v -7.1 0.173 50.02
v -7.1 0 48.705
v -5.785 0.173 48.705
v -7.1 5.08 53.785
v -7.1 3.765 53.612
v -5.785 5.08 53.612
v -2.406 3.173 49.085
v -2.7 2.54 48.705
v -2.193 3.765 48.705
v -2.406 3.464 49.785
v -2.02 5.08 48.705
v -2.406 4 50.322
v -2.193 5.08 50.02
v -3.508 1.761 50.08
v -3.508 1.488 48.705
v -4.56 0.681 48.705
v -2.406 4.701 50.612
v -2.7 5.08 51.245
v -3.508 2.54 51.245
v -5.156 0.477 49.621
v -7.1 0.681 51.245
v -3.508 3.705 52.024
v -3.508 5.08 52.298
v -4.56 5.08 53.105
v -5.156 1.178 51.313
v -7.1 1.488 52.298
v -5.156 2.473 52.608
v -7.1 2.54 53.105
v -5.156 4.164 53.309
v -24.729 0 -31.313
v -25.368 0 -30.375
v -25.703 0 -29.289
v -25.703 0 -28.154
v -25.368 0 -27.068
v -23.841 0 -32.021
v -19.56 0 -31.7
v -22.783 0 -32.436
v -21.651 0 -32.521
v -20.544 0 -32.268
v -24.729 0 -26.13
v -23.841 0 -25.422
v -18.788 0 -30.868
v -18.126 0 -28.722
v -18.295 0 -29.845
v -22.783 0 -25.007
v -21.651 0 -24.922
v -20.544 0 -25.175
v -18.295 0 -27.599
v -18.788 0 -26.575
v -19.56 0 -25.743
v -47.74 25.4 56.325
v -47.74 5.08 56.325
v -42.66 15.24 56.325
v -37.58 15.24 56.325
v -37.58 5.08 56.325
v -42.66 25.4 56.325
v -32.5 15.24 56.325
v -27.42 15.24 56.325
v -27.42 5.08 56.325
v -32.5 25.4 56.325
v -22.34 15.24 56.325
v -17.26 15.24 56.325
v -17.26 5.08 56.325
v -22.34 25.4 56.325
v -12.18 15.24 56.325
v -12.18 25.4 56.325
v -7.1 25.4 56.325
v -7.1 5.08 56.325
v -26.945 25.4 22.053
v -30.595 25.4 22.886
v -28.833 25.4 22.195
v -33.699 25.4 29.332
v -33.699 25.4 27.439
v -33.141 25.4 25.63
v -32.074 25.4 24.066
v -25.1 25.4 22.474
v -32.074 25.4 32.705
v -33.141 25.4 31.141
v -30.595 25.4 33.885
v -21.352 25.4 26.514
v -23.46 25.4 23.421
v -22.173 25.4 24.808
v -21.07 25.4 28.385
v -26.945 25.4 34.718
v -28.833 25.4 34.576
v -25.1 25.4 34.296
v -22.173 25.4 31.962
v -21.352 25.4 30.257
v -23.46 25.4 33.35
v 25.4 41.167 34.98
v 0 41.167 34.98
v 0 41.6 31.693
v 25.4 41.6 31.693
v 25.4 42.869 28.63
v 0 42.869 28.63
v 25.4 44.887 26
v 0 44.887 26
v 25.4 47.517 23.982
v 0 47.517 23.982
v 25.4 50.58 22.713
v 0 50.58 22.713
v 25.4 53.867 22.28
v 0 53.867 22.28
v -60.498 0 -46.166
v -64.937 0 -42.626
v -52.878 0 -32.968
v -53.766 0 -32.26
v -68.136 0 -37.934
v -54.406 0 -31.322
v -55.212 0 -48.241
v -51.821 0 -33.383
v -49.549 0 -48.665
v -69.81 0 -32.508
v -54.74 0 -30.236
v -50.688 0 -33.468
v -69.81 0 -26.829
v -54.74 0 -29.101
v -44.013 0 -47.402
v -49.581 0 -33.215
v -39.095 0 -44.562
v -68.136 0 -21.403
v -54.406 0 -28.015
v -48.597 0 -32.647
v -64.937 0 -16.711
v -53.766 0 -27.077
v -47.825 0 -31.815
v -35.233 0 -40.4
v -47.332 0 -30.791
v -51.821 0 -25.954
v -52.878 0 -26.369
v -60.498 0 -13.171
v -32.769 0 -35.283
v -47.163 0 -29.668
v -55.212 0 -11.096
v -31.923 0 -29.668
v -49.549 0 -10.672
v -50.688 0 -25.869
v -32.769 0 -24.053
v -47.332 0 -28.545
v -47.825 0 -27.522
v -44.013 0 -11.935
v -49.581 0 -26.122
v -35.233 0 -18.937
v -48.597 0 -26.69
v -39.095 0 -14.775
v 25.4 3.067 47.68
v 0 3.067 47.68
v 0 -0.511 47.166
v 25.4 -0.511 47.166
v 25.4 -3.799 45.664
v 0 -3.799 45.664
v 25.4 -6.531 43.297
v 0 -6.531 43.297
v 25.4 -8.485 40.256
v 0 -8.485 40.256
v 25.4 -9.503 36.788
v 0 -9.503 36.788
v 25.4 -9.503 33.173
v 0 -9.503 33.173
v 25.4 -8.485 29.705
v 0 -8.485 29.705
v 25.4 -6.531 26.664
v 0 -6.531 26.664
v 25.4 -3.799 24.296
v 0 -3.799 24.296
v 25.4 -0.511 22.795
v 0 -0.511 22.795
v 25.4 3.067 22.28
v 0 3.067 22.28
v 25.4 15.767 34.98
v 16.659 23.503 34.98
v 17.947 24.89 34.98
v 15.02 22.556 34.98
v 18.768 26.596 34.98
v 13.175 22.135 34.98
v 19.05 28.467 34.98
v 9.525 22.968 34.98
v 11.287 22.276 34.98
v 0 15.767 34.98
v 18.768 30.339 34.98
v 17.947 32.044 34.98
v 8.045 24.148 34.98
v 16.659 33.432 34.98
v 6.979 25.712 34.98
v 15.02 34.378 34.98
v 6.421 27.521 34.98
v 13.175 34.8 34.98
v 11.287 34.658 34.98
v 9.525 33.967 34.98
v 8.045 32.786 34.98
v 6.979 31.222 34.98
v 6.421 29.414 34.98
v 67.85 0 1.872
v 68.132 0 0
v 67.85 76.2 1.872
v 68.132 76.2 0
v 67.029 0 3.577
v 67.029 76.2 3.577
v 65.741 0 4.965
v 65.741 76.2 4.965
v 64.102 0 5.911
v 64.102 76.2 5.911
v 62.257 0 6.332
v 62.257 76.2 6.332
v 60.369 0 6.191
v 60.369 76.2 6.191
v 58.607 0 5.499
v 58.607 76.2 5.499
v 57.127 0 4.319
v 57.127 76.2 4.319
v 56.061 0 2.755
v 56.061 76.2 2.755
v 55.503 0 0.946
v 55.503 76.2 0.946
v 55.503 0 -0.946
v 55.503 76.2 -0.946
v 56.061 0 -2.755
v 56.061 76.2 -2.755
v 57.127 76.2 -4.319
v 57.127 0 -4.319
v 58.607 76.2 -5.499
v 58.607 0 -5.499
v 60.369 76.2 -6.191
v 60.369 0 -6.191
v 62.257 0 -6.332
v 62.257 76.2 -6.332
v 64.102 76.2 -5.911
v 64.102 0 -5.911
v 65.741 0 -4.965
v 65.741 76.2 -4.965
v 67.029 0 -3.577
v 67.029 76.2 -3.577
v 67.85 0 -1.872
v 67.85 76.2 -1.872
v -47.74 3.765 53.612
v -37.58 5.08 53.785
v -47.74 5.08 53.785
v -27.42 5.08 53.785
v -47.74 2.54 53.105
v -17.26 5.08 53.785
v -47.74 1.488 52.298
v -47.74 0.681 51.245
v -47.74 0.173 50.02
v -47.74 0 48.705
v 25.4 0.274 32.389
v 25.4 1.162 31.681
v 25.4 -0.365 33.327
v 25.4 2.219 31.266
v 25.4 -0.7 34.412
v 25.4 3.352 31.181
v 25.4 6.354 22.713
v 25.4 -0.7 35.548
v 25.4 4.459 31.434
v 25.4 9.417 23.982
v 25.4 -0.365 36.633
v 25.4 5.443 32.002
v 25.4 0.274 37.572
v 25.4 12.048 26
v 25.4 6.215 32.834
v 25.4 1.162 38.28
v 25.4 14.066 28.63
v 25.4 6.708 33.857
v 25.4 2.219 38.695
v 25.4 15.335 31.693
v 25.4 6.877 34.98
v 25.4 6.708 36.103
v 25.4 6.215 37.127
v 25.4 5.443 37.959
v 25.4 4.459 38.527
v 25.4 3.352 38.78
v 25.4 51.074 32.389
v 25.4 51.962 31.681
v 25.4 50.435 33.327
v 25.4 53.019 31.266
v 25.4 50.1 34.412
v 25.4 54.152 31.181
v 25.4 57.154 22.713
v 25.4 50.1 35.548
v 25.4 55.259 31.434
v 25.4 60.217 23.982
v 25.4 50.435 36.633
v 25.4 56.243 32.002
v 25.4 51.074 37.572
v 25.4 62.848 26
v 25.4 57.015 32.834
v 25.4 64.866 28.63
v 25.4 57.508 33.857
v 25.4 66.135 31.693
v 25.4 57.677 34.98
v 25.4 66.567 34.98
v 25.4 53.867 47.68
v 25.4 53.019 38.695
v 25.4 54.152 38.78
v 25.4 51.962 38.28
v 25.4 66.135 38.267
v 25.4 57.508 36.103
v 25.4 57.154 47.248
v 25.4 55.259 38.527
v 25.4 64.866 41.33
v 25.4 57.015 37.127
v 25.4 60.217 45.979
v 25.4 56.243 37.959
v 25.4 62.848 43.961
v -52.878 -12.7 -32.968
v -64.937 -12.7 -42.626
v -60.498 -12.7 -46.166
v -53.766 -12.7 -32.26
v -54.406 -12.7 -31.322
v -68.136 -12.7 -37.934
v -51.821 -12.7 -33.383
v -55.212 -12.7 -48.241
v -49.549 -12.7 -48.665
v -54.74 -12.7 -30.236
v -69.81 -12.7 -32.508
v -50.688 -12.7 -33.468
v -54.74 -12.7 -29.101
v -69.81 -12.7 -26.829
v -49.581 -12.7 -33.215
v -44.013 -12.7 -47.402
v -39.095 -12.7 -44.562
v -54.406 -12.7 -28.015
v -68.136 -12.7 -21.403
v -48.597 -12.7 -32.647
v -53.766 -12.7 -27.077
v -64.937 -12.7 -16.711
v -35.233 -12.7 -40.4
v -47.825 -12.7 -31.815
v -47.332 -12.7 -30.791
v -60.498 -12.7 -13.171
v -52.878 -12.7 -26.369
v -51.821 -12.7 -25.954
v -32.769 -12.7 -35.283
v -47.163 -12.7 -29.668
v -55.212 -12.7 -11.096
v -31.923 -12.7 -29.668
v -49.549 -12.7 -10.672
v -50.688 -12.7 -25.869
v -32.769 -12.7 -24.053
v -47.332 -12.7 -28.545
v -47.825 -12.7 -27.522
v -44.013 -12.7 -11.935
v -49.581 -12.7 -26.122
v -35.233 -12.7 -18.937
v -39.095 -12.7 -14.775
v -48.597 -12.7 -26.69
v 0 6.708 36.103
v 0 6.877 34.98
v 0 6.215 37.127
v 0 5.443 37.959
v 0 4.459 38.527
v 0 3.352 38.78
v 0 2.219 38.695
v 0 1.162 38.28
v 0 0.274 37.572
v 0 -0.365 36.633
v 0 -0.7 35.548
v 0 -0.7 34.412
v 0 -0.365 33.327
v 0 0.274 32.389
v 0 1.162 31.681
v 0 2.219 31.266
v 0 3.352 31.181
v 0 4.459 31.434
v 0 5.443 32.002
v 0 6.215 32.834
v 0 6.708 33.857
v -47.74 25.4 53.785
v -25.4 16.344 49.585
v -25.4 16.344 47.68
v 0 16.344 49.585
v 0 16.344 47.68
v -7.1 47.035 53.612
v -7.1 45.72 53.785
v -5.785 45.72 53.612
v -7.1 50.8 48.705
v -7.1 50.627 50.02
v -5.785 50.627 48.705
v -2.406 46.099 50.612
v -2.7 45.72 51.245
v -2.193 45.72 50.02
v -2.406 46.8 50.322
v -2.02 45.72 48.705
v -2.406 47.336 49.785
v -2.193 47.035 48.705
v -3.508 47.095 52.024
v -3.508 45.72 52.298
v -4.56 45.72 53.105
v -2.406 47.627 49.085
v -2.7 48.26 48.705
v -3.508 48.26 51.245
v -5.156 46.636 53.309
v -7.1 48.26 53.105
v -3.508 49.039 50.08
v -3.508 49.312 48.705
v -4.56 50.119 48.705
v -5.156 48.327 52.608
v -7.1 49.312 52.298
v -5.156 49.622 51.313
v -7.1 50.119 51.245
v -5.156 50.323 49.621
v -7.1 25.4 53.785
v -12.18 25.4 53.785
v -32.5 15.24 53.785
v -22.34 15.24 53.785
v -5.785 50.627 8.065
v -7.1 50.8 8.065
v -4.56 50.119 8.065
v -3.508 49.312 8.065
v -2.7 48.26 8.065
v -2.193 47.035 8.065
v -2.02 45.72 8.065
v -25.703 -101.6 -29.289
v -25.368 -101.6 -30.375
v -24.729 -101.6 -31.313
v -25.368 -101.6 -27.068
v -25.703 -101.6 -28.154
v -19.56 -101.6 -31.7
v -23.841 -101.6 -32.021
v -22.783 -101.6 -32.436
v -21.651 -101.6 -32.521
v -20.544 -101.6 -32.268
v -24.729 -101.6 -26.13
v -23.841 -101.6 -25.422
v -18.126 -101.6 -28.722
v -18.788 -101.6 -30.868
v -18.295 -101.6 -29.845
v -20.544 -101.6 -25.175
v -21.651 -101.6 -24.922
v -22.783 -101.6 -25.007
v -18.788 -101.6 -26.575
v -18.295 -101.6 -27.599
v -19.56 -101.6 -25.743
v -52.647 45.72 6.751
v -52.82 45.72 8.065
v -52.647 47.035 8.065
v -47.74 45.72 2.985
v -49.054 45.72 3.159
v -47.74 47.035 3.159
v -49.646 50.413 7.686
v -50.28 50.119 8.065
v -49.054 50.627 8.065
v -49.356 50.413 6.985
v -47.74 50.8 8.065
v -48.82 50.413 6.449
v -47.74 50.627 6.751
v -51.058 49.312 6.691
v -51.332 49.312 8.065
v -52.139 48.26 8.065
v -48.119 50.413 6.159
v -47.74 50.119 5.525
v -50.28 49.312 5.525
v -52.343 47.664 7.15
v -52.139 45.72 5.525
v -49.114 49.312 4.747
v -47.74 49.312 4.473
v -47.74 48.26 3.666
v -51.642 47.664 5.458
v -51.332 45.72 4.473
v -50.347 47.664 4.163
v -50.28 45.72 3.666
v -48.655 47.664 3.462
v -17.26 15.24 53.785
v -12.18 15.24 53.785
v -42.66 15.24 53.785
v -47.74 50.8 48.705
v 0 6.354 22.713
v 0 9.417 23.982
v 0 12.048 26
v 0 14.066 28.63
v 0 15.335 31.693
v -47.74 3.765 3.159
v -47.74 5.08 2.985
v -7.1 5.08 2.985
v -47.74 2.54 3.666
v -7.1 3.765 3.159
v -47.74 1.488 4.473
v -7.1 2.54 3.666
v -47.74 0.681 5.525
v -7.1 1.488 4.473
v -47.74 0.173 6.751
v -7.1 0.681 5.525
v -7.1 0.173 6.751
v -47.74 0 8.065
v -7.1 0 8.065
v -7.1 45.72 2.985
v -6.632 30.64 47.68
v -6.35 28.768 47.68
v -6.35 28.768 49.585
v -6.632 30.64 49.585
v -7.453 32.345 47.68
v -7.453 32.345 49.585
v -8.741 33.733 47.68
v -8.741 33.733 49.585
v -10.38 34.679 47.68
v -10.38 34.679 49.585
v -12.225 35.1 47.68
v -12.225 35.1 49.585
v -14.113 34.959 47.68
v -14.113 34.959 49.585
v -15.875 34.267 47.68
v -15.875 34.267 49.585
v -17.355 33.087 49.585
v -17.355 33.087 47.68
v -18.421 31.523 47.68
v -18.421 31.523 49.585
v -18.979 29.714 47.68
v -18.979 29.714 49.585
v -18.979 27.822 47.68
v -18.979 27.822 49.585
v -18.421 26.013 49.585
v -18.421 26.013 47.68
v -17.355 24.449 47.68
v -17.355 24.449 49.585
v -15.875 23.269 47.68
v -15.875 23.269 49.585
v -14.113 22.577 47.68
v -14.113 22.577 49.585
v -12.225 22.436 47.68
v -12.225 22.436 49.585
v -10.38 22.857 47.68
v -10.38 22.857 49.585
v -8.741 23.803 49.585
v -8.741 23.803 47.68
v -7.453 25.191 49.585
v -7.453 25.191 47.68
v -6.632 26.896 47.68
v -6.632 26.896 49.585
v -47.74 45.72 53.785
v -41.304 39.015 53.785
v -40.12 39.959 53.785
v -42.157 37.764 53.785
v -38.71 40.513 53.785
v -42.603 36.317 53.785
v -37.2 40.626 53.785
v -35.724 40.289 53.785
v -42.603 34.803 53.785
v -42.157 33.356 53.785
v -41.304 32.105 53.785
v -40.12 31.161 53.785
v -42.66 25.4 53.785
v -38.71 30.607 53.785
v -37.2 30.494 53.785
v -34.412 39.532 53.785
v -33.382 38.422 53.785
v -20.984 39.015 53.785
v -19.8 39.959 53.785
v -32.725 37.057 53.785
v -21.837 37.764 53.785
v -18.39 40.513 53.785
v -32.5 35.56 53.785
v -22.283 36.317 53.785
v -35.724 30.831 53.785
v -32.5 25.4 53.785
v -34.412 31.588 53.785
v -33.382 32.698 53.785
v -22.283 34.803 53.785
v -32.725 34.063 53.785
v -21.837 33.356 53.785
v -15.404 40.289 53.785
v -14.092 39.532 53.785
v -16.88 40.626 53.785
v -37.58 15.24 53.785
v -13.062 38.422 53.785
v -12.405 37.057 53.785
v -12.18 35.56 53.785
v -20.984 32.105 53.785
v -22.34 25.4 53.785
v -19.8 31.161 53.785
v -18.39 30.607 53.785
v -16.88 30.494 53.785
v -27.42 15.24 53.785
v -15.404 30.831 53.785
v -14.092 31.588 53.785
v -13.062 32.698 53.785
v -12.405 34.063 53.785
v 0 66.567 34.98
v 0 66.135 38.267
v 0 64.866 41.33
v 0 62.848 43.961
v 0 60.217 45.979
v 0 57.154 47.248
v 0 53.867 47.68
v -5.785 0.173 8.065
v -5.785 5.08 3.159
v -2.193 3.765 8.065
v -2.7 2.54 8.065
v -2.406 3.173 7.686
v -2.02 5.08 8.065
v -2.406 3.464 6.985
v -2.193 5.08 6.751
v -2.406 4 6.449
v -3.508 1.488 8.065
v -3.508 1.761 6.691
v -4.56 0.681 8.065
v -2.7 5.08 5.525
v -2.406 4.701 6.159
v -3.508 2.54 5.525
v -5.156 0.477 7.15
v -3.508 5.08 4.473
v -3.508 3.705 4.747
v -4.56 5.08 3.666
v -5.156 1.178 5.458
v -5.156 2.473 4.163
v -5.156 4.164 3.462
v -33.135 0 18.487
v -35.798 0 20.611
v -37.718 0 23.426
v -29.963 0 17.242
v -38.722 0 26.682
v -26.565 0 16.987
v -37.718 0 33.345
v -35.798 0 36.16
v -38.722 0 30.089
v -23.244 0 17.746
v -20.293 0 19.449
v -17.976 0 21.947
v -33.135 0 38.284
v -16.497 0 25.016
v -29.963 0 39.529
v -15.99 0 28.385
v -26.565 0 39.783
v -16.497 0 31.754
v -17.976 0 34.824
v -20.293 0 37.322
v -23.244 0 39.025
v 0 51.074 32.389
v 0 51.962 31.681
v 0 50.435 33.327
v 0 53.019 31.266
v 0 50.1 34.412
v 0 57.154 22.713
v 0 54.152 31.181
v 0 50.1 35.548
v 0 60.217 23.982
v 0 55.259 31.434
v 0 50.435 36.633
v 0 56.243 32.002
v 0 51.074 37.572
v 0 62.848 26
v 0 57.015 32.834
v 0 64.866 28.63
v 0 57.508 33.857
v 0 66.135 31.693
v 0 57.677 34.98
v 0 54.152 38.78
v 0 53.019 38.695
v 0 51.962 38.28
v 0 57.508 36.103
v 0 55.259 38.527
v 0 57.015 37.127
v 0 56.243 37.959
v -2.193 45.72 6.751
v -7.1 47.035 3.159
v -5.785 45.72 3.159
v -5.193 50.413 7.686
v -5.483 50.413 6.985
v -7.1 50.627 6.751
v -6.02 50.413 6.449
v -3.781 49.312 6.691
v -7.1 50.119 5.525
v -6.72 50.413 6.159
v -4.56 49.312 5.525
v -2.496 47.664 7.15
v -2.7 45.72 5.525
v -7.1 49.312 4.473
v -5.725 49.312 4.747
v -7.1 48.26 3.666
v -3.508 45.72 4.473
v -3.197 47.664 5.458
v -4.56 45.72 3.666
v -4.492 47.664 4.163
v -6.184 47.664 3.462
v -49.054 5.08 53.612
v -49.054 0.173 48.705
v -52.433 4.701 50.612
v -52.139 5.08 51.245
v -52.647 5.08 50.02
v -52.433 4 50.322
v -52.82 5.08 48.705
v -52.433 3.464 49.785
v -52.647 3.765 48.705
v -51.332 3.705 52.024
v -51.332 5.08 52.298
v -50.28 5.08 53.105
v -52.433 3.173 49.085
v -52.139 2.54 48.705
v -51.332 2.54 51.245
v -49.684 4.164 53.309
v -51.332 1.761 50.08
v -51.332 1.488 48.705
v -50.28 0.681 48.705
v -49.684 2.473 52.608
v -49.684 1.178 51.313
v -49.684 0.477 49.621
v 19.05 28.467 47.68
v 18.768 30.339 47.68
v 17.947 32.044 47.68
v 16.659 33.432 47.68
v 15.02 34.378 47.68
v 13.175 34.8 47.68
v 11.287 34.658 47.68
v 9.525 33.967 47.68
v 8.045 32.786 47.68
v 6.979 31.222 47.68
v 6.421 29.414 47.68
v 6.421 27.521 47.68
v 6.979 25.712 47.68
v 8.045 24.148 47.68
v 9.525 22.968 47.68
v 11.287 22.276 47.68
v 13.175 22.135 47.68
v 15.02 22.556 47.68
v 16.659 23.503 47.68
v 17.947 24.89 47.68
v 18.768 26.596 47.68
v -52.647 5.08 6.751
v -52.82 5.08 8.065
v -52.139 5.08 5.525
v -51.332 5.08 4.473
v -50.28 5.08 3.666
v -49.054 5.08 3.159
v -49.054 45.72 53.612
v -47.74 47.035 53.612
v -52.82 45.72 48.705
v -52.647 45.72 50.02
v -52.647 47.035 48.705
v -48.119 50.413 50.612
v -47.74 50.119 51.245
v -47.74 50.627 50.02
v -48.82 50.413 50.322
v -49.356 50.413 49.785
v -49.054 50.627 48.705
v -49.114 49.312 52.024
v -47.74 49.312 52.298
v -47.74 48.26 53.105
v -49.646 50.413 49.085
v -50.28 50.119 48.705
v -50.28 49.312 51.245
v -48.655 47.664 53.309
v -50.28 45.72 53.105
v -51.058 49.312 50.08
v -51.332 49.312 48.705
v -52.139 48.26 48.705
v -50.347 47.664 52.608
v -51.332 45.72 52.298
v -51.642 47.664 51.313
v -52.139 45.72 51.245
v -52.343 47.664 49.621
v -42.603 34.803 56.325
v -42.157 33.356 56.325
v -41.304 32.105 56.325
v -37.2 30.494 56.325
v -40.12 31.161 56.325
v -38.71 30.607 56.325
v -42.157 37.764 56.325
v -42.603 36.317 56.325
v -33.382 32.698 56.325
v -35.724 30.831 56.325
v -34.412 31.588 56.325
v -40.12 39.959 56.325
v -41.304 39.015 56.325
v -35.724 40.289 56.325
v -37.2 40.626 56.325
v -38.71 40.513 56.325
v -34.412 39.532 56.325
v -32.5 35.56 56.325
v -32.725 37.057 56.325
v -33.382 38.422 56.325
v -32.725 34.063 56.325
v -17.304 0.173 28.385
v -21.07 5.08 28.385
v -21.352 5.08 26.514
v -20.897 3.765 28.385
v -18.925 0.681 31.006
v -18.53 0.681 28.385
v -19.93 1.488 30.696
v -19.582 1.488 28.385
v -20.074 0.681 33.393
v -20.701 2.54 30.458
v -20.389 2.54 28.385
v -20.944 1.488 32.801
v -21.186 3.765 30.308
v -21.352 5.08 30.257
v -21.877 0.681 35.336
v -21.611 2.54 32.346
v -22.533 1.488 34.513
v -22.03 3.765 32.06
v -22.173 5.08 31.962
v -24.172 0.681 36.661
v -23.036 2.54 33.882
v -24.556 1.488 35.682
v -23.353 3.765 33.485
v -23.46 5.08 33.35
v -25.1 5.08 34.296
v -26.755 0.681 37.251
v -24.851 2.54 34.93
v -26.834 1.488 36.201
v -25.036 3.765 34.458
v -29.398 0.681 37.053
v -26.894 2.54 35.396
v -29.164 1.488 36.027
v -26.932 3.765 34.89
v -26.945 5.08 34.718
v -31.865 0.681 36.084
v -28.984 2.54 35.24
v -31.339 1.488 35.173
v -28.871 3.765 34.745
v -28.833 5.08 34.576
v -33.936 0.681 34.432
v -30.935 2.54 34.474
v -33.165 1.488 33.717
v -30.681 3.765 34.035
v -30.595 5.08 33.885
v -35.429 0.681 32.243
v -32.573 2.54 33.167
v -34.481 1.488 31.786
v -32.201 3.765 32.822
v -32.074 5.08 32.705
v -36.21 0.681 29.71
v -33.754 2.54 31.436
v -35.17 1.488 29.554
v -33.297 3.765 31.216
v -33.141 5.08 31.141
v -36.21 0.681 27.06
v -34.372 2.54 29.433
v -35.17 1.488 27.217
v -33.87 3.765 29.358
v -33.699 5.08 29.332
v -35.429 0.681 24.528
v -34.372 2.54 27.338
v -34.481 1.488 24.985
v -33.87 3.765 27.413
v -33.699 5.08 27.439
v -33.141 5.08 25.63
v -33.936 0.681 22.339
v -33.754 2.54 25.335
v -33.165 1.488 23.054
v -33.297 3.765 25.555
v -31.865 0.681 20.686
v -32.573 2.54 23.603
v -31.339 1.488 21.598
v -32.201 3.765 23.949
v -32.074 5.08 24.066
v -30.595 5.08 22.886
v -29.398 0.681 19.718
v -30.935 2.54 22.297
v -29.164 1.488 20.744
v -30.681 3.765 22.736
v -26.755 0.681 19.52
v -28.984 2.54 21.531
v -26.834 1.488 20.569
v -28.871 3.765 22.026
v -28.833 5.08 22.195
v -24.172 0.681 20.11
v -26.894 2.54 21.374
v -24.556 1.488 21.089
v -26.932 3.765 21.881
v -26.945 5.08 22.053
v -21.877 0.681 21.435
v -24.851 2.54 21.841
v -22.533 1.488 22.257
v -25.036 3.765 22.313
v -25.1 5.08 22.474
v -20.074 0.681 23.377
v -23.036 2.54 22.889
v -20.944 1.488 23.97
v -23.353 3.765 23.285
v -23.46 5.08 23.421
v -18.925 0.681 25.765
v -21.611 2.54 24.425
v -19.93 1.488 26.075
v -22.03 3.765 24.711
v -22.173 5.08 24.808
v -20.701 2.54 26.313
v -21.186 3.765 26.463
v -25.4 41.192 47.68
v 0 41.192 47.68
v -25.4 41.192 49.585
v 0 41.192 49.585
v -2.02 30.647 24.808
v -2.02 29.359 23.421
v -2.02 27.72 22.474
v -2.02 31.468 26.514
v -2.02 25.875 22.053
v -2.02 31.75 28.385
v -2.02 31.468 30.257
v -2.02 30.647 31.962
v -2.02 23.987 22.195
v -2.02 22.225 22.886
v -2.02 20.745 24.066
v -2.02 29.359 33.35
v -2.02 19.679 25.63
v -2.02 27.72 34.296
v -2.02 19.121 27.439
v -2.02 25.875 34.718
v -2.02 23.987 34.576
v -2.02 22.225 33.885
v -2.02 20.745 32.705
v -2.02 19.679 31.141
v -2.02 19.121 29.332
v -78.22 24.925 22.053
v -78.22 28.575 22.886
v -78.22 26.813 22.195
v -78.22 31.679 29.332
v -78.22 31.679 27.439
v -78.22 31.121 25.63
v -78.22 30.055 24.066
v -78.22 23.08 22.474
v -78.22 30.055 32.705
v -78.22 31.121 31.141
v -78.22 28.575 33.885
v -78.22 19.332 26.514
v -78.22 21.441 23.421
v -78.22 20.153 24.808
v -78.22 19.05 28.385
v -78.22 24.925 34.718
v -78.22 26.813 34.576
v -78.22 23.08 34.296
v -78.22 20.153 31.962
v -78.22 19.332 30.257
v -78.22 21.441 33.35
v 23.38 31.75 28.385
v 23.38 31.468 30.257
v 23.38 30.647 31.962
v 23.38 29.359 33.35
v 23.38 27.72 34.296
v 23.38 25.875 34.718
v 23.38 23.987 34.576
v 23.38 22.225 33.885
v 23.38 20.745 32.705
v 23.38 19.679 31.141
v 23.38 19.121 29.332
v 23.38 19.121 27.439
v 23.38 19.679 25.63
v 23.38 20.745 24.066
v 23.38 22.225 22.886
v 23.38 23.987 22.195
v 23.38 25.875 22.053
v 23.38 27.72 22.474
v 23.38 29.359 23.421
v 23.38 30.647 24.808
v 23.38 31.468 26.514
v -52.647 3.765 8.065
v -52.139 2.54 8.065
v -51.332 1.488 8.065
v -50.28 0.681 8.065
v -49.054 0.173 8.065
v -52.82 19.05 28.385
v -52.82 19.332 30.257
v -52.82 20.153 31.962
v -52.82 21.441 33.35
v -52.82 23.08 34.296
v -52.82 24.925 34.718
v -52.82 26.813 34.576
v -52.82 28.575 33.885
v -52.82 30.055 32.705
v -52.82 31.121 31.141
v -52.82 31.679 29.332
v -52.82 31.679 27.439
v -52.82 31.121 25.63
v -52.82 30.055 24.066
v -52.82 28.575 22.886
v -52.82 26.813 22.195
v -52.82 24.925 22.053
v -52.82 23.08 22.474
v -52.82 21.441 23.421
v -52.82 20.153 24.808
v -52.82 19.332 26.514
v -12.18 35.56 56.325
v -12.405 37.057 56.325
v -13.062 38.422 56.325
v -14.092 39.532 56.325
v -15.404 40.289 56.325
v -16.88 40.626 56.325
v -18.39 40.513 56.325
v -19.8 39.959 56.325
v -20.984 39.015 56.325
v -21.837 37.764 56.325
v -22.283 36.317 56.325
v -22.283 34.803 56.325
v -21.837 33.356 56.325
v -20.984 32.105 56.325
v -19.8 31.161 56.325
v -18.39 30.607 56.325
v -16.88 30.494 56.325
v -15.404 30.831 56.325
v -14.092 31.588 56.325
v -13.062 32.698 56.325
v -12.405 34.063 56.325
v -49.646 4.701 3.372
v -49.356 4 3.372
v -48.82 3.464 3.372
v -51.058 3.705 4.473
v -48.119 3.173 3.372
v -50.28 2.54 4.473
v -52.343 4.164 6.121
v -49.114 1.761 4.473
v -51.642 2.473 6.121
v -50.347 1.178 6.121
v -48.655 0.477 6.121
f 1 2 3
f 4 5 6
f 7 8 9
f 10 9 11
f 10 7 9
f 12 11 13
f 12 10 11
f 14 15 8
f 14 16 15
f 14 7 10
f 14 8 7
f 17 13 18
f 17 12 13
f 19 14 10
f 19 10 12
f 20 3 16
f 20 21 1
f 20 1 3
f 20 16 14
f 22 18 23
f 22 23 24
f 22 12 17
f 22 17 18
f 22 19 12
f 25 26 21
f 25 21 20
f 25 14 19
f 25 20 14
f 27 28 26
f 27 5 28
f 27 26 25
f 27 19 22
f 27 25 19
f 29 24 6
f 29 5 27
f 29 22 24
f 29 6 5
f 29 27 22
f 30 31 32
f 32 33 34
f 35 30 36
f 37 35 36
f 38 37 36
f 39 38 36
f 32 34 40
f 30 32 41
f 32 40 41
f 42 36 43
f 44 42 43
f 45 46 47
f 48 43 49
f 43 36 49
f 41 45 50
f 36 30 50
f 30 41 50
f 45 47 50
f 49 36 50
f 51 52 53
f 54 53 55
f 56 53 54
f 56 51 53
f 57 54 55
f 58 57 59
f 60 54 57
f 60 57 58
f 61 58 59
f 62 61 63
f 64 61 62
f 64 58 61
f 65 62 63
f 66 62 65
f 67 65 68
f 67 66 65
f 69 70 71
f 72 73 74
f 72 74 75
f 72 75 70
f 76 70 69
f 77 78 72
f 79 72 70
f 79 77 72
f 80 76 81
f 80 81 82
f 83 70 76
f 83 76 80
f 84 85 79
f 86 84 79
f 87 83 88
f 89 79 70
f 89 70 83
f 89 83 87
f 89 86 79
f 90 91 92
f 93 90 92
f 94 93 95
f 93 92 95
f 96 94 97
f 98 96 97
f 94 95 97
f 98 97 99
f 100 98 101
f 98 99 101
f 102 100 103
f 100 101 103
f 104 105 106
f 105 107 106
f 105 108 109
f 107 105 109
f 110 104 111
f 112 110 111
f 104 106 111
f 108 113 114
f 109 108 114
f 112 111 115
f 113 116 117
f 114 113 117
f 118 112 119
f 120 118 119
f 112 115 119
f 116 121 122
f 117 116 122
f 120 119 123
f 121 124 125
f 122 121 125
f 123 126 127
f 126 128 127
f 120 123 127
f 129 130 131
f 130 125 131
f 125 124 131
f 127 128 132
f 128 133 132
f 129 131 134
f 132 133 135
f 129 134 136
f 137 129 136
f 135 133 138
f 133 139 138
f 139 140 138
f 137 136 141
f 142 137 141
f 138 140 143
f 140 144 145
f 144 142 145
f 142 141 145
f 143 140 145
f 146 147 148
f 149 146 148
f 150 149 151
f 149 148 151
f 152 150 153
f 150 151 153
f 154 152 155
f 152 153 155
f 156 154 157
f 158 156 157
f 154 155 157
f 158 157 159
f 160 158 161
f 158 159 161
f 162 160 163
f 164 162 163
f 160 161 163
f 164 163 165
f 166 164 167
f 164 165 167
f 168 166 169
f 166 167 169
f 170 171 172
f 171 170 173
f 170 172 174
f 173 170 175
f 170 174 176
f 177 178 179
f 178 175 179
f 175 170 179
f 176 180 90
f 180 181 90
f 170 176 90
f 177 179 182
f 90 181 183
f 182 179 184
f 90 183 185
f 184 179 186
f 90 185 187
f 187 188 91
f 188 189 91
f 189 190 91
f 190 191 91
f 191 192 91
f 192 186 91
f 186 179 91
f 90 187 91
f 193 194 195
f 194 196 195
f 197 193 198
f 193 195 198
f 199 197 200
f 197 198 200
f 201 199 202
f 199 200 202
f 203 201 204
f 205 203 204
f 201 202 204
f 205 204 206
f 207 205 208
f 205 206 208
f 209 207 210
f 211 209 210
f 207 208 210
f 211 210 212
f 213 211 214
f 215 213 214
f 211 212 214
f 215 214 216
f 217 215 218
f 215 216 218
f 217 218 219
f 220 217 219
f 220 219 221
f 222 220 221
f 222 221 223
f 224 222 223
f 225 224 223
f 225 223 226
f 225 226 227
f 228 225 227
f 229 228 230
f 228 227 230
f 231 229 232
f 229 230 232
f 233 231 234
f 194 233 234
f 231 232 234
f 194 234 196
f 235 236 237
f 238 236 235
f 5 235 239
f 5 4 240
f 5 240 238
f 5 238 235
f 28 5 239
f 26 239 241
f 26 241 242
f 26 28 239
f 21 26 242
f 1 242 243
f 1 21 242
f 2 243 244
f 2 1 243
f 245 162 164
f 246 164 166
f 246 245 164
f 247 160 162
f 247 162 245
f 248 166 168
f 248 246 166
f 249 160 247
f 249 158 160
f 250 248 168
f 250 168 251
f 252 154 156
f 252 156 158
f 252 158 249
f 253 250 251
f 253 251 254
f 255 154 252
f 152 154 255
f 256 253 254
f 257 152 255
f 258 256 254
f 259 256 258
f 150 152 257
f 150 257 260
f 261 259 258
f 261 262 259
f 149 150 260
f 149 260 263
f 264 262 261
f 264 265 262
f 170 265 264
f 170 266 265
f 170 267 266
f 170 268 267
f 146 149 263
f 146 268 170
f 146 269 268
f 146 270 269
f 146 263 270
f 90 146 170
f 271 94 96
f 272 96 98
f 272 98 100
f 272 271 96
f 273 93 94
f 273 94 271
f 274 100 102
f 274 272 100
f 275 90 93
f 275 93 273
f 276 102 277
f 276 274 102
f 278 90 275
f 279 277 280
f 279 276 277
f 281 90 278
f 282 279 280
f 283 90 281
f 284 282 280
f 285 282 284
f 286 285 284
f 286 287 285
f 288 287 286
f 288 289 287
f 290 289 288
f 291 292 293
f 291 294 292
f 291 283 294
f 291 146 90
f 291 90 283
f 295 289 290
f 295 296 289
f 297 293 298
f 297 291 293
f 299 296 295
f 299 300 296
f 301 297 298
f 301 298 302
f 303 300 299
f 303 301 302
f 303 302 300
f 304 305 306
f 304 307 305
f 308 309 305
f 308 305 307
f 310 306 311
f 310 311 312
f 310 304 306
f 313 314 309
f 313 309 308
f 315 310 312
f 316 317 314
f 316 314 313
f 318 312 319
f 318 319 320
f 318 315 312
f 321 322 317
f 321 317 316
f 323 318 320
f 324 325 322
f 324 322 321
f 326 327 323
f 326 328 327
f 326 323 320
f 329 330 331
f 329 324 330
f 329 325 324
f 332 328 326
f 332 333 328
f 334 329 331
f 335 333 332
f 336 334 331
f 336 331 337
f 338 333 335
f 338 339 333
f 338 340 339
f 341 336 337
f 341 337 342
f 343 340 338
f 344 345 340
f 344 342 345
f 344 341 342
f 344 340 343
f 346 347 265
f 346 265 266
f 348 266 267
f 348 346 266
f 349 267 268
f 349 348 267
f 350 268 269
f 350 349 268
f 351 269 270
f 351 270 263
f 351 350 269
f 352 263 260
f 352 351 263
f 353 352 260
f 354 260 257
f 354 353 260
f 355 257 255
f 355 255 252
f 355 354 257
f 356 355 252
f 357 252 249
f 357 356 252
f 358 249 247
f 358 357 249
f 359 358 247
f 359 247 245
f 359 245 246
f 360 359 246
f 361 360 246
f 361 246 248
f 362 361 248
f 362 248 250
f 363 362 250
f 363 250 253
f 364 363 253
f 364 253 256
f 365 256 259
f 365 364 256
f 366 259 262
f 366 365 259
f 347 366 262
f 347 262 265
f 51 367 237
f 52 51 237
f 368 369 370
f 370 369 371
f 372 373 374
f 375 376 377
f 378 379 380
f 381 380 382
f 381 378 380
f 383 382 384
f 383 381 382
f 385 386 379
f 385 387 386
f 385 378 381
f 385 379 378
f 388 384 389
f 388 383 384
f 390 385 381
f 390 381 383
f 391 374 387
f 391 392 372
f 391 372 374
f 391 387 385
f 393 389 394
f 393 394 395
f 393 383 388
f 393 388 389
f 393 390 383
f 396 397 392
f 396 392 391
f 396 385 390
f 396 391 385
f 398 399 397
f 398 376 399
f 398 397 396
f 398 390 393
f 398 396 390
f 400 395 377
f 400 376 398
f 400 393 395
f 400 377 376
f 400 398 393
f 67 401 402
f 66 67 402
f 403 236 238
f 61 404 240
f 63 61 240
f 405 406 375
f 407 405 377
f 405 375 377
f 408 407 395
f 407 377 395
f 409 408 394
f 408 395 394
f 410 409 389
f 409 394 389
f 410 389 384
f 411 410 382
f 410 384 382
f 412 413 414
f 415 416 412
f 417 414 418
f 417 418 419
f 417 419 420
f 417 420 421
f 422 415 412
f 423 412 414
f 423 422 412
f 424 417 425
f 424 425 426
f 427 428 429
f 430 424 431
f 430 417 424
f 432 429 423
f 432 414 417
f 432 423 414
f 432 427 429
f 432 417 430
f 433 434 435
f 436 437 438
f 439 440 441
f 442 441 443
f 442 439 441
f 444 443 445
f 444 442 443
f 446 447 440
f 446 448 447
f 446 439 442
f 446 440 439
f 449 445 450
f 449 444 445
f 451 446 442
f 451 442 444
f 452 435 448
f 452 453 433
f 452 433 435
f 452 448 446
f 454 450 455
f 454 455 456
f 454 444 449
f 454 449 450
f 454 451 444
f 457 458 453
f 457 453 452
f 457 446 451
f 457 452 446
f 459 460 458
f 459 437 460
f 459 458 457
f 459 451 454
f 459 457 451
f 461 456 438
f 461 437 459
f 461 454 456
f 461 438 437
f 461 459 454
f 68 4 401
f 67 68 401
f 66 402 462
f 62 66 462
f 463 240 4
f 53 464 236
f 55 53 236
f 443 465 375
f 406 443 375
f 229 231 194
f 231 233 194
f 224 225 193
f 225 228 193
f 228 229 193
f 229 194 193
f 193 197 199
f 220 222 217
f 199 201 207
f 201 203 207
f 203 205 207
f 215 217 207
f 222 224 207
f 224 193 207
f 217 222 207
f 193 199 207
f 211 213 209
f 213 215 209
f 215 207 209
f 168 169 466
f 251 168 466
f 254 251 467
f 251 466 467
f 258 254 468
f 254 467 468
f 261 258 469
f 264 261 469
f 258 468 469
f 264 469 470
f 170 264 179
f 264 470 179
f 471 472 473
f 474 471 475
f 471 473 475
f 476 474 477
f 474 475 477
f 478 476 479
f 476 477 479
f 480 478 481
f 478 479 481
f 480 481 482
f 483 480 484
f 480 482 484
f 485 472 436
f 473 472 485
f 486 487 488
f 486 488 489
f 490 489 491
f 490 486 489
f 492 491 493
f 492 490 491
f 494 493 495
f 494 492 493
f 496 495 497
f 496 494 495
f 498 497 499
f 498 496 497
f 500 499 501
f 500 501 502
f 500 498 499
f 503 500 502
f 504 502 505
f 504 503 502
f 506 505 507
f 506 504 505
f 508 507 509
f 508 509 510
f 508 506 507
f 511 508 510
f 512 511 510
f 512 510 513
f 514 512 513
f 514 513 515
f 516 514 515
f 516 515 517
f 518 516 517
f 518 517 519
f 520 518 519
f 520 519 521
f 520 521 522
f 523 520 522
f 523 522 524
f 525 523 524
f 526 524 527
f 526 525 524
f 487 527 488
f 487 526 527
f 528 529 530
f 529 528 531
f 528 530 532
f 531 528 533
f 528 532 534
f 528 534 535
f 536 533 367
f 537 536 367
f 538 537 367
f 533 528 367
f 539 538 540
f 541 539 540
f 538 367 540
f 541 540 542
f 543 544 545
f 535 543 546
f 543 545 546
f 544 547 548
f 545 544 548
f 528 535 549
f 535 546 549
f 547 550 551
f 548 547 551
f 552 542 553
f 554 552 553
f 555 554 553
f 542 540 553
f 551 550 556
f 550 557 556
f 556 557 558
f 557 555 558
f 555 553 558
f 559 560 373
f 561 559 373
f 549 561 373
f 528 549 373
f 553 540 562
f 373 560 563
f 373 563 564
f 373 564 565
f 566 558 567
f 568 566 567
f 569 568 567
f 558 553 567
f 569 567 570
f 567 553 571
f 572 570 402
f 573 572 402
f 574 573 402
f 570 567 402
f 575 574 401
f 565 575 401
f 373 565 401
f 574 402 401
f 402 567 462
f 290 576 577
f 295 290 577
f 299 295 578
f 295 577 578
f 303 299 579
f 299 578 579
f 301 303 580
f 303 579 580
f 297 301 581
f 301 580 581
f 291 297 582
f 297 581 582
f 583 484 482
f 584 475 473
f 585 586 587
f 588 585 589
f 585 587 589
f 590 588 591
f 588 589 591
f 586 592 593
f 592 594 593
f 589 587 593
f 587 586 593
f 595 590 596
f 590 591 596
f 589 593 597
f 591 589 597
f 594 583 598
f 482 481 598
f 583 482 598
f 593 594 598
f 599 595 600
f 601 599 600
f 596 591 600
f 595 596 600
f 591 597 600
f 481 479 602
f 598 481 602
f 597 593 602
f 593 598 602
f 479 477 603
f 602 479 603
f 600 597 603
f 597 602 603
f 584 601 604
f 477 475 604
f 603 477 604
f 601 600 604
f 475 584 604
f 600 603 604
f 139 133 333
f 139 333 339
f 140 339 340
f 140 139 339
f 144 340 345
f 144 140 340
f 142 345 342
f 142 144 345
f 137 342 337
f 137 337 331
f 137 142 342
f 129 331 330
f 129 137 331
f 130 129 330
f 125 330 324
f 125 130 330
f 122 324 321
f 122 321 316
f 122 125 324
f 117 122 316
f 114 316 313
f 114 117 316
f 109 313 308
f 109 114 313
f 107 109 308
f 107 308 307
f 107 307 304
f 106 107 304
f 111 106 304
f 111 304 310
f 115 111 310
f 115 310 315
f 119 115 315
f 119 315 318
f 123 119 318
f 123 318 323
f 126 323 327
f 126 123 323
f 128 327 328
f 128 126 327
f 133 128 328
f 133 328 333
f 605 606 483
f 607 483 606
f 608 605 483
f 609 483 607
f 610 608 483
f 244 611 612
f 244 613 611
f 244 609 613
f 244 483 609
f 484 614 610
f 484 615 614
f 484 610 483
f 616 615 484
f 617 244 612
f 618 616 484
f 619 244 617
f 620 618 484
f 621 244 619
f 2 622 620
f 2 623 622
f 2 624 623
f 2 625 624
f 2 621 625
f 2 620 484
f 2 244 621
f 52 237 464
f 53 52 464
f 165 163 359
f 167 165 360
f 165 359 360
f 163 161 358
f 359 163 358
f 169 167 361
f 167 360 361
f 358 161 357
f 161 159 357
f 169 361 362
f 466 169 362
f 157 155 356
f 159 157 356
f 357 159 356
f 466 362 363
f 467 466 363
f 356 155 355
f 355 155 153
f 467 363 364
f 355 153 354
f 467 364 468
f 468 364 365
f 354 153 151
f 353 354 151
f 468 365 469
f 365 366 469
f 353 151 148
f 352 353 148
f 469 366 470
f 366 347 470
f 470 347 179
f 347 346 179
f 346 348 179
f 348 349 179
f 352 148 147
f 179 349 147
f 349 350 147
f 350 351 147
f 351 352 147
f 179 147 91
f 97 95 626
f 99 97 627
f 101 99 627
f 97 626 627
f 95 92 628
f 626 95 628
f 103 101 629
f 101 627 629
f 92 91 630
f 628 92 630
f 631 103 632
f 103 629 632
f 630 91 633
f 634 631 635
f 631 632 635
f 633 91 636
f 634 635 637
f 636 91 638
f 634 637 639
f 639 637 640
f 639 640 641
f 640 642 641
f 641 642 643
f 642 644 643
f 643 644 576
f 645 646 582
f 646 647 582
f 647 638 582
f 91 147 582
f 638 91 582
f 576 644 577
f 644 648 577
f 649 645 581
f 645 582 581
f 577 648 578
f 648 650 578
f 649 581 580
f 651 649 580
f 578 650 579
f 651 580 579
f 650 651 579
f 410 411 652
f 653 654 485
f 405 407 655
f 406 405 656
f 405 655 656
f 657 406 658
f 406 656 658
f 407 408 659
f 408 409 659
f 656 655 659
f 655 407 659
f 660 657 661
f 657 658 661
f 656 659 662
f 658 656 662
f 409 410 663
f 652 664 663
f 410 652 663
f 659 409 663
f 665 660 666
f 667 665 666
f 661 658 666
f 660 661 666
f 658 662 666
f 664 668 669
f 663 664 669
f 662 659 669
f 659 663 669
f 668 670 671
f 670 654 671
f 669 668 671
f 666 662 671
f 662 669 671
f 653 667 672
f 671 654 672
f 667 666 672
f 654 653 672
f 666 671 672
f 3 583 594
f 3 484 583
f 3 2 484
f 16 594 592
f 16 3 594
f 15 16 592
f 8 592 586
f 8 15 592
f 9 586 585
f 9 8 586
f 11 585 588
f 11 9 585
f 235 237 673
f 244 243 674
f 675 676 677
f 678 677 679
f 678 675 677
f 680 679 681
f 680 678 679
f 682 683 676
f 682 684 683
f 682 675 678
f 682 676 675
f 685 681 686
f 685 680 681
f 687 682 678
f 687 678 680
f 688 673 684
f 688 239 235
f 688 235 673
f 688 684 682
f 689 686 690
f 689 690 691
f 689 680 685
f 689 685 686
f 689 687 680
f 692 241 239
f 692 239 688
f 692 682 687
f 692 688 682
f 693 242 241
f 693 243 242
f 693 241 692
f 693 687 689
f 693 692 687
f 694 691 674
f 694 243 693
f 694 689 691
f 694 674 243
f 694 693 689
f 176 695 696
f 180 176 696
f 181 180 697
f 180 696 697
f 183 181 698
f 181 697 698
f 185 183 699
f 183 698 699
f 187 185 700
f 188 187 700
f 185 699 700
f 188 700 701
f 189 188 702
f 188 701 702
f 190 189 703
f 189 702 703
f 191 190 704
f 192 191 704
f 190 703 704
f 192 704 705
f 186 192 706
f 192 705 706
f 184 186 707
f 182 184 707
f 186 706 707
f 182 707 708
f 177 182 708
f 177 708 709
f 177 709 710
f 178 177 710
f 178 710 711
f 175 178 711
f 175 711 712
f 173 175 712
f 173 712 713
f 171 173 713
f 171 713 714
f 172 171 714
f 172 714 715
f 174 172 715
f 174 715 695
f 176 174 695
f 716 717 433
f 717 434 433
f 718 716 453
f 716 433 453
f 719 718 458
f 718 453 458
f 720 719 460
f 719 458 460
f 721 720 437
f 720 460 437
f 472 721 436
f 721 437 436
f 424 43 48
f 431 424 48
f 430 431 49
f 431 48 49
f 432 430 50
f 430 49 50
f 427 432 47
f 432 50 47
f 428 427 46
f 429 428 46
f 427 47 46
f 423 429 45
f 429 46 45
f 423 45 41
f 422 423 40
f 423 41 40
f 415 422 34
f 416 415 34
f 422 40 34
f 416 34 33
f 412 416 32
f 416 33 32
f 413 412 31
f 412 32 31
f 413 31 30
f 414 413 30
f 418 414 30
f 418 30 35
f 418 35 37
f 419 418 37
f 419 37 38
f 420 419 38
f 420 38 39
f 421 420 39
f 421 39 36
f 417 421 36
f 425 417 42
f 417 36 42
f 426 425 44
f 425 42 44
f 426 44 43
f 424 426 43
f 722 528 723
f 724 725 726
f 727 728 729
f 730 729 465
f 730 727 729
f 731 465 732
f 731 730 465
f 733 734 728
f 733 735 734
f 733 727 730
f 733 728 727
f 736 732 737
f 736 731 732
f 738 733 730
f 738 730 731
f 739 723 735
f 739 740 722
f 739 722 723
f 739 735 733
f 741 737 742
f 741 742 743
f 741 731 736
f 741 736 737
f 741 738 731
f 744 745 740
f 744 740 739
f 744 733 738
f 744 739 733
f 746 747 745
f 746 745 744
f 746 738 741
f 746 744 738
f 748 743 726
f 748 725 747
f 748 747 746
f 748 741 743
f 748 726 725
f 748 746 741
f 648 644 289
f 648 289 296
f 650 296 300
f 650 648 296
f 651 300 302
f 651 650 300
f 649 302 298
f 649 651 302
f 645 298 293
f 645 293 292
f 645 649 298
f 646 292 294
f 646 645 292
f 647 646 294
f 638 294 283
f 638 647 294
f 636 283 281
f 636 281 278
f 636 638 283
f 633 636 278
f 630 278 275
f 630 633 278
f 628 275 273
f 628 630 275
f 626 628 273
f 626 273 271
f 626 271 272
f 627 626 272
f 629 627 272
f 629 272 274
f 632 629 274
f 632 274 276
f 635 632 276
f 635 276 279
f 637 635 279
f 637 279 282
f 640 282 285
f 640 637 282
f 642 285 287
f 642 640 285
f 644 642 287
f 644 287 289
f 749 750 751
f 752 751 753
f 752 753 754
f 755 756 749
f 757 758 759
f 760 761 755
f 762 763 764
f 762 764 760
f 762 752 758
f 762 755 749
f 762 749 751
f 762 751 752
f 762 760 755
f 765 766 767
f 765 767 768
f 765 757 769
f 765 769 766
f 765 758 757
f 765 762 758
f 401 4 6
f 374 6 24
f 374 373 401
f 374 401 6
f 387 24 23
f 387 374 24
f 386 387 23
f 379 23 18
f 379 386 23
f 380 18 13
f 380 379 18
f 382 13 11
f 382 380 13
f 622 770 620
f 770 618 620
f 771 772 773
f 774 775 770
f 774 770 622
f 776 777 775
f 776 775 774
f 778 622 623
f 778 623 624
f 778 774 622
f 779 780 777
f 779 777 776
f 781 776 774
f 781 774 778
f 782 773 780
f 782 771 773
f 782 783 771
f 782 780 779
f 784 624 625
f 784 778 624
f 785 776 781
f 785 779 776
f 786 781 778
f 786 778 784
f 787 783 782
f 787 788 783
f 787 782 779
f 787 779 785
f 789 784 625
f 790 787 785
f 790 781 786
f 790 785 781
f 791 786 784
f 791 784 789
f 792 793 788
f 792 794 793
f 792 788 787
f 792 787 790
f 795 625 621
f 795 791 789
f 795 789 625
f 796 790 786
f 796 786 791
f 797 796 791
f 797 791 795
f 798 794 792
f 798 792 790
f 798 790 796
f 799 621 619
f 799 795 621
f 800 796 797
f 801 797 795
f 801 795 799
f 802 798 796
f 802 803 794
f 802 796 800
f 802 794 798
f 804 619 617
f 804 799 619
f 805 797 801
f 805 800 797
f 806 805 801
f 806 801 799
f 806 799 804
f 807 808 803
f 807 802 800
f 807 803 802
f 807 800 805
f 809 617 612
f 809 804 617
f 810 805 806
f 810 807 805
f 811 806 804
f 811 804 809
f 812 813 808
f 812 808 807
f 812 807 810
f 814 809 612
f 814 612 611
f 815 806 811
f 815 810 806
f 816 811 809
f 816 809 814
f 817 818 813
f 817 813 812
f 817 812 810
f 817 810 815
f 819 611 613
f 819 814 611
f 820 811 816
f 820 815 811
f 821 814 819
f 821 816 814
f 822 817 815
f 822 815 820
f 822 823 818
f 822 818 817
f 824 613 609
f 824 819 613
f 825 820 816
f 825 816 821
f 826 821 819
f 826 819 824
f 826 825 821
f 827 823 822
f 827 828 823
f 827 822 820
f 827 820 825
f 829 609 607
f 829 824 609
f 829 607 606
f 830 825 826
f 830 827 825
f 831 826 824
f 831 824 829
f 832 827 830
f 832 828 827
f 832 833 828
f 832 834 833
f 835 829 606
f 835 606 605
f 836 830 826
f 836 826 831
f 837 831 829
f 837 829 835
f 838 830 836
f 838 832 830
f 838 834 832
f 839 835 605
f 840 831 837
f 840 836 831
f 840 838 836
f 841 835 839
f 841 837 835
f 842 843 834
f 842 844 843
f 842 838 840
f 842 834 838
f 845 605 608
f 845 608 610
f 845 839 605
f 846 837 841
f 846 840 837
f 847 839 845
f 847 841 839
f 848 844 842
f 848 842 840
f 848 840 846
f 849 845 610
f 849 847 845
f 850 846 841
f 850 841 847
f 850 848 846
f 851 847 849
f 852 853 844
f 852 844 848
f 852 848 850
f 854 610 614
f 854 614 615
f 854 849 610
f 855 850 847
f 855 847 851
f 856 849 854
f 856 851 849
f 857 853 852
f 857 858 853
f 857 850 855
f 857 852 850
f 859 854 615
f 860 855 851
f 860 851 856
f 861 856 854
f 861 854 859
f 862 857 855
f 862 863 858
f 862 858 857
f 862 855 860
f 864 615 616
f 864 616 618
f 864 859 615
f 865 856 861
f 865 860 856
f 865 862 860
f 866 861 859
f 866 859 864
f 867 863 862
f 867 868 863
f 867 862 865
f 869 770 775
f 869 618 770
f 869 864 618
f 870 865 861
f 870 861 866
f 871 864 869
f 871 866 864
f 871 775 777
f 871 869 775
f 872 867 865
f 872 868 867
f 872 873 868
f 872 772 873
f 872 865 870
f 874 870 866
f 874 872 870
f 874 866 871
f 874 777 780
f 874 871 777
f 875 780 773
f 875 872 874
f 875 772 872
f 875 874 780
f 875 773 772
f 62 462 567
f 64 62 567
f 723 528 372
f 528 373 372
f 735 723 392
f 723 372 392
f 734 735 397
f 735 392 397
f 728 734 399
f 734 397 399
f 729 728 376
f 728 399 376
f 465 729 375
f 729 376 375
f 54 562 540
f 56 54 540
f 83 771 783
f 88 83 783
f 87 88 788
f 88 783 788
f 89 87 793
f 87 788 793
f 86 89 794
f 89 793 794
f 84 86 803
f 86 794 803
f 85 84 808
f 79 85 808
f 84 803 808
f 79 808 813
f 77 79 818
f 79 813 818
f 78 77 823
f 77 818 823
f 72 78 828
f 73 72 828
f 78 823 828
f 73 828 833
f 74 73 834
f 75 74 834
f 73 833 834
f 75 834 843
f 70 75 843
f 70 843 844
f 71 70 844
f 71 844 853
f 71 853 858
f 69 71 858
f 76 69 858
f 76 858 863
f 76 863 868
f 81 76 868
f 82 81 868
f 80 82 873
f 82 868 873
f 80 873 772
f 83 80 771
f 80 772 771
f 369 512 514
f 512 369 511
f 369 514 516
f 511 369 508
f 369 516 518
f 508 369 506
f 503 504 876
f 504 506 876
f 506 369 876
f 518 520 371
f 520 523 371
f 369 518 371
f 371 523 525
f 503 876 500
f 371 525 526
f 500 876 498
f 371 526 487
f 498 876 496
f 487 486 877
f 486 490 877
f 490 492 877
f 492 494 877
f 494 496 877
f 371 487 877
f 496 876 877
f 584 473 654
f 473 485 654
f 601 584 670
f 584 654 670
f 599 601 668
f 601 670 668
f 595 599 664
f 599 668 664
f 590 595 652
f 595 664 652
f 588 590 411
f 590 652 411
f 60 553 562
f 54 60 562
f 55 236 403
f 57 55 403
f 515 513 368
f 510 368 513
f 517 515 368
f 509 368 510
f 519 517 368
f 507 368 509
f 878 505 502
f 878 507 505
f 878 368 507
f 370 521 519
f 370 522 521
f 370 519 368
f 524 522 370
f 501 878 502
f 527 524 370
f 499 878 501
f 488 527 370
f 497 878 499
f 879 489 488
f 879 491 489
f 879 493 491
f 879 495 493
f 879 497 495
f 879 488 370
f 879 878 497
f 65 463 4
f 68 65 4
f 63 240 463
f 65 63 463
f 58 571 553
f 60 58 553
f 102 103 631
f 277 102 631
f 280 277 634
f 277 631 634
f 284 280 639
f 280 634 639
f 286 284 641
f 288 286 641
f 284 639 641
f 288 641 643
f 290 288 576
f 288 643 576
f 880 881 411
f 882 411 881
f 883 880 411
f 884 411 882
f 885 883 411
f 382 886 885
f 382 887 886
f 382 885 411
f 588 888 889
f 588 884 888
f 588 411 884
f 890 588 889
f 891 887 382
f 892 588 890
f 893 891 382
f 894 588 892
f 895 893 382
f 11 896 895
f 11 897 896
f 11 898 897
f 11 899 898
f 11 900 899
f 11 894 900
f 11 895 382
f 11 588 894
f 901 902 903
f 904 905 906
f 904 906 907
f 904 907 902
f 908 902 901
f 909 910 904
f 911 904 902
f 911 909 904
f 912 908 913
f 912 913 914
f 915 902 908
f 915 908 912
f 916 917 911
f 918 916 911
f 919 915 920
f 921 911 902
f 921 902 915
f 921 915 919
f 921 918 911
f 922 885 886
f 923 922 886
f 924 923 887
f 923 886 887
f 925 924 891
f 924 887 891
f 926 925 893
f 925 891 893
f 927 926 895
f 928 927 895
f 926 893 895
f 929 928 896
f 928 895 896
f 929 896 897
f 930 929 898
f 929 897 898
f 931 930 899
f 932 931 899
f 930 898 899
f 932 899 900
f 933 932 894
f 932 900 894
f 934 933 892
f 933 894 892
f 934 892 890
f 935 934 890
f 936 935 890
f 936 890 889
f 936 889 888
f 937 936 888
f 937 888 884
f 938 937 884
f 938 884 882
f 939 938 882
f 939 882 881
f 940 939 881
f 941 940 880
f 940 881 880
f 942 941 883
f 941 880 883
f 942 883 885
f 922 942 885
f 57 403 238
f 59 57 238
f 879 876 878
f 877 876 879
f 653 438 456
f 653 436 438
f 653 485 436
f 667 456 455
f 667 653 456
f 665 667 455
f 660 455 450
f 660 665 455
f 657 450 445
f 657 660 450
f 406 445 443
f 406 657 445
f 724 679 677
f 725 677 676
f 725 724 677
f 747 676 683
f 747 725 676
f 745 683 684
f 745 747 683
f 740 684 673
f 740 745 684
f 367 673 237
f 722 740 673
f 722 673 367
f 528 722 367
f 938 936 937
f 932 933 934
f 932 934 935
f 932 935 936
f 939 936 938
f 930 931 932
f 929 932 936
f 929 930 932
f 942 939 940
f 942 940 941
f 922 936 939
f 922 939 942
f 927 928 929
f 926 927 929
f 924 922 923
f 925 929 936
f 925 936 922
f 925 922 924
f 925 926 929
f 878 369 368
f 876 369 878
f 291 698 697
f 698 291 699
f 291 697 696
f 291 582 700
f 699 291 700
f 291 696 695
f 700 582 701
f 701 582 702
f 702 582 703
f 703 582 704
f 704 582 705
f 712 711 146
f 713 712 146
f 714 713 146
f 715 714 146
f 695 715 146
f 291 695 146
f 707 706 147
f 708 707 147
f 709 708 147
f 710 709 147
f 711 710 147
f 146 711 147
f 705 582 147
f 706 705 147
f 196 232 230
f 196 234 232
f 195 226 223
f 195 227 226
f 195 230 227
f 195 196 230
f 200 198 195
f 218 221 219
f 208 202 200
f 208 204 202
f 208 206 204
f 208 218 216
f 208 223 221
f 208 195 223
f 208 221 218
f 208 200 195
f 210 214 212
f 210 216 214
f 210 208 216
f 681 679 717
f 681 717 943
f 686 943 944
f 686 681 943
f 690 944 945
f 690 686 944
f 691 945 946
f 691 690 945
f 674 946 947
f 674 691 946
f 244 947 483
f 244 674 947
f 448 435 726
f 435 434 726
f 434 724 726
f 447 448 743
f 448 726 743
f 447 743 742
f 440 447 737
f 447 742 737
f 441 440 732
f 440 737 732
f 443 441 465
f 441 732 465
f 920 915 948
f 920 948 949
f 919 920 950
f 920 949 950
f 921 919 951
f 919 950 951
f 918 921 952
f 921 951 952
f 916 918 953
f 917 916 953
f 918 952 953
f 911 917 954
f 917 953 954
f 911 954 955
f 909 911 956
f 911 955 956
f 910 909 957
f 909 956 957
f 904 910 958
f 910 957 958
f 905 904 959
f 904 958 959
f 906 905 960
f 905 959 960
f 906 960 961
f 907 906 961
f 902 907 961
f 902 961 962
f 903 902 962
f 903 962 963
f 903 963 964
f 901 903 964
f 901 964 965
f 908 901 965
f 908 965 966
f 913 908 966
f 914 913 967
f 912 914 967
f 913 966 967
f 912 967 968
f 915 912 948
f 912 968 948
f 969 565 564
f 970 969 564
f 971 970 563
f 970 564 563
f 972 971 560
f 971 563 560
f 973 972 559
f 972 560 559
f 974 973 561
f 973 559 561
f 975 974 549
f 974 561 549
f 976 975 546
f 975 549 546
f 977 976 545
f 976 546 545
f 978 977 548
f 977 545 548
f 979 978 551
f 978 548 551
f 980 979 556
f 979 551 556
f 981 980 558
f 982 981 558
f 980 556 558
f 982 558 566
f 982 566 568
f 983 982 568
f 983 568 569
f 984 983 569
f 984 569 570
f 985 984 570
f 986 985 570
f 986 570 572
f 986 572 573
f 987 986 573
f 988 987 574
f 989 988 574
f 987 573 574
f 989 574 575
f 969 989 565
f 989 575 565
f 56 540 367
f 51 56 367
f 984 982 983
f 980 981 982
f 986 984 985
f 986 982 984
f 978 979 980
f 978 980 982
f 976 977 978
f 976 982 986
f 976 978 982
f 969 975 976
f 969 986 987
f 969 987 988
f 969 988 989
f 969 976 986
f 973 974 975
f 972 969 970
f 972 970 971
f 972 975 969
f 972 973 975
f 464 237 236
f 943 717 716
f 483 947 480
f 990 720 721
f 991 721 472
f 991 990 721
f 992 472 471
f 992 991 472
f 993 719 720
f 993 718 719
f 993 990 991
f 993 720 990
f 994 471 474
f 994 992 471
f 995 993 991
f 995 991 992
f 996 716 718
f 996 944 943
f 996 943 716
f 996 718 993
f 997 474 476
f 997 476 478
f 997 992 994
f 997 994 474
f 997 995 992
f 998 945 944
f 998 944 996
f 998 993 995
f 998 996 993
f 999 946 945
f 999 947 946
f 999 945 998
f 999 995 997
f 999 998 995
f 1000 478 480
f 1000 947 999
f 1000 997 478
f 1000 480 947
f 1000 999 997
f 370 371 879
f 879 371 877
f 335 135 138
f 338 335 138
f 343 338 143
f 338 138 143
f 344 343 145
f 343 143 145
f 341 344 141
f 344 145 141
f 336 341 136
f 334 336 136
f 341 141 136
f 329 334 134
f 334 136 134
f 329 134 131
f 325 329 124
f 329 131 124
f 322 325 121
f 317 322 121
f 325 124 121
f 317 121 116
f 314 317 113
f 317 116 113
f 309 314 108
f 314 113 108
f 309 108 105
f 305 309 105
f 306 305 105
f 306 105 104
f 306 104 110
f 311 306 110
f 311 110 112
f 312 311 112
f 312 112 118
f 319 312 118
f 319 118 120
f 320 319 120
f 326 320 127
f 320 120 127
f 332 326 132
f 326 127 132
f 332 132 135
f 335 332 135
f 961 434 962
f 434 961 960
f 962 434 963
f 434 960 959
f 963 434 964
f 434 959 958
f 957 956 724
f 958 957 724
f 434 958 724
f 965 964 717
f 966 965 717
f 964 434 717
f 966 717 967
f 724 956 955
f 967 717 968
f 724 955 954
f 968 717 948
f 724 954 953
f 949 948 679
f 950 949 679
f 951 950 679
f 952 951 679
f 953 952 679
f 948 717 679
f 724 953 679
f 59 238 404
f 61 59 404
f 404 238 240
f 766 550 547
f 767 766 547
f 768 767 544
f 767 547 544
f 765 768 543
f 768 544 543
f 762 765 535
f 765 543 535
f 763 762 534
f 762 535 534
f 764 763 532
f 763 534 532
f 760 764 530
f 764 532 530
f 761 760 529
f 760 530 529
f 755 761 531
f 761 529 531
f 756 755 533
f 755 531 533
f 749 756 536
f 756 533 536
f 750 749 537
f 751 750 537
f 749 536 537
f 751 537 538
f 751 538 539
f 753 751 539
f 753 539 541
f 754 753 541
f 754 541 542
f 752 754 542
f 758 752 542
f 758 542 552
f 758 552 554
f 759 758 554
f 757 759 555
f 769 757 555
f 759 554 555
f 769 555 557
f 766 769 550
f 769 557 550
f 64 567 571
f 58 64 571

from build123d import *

# Parameters (mm, degrees)
F0_R      = 19.05
F0_R_2    = 3.81
F1_DEPTH  = 12.7
F2_R      = 3.81
F3_DEPTH  = 101.6
F4_R      = 3.81
F5_DEPTH  = 25.4
F6_R      = 6.35
F7_DEPTH  = 96.399695
F8_W      = 6.35
F8_H      = 76.2
F10_W     = 25.4
F10_H     = 24.847228
F10_R     = 6.35
F11_DEPTH = 1.905
F12_W     = 50.8
F12_H     = 50.8
F12_R     = 6.35
F13_DEPTH = 50.8
F14_R     = 6.35
F15_DEPTH = 25.4
F16_R     = 5.08
F17_R     = 6.35
F18_DEPTH = 25.4
F19_R     = 6.35
F20_DEPTH = 25.4
F21_R     = 5.08
F22_DEPTH = 2.54


with BuildPart() as f1:
    # F0 (on Front) → F1 (new body)
    with BuildSketch(Plane.XZ):
        with Locations((-50.972842, -29.668404)):
            Circle(F0_R)
        with Locations((-50.972842, -29.668404)):
            Circle(F0_R_2, mode=Mode.SUBTRACT)
    extrude(amount=F1_DEPTH)


with BuildPart() as f3:
    # F2 (on Front) → F3 (new body)
    with BuildSketch(Plane.XZ):
        with Locations((-21.935683, -28.721539)):
            Circle(F2_R)
    extrude(amount=F3_DEPTH)


with BuildPart() as f5:
    # F4 (on Right) → F5 (new body)
    with BuildSketch(Plane.YZ):
        with BuildLine():
            ThreePointArc((53.867258, 22.280292), (62.847514, 26.000035), (66.567258, 34.980292))
            ThreePointArc((66.567258, 34.980292), (62.847514, 43.960548), (53.867258, 47.680292))
            ThreePointArc((53.867258, 47.680292), (44.887002, 43.960548), (41.167258, 34.980292))
            ThreePointArc((41.167258, 34.980292), (44.887002, 26.000035), (53.867258, 22.280292))
        make_face()
        with Locations((53.867258, 34.980292)):
            Circle(F4_R, mode=Mode.SUBTRACT)
        with BuildLine():
            ThreePointArc((15.767258, 34.980292), (12.047514, 43.960548), (3.067258, 47.680292))
            ThreePointArc((3.067258, 47.680292), (-9.632742, 34.980292), (3.067258, 22.280292))
            ThreePointArc((3.067258, 22.280292), (12.047514, 26.000035), (15.767258, 34.980292))
        make_face()
        with Locations((3.067258, 34.980292)):
            Circle(F4_R, mode=Mode.SUBTRACT)
        with BuildLine():
            ThreePointArc((41.167258, 34.980292), (44.887002, 43.960548), (53.867258, 47.680292))
            Line((53.867258, 47.680292), (3.067258, 47.680292))
            ThreePointArc((3.067258, 47.680292), (12.047514, 43.960548), (15.767258, 34.980292))
            Line((15.767258, 34.980292), (41.167258, 34.980292))
        make_face()
    extrude(amount=F5_DEPTH)

    # F6 (on face) → F7 (cut, through all)
    with BuildSketch(Plane.XY.offset(47.680292)):
        with Locations((12.7, 28.467258)):
            Circle(F6_R)
    extrude(amount=-F7_DEPTH, mode=Mode.SUBTRACT)


with BuildPart() as f9:
    # F8 (on Top) → F9 (revolve)
    with BuildSketch(Plane.XY):
        with Locations((64.957304, 38.1)):
            Rectangle(F8_W, F8_H)
    revolve(axis=Axis((61.782304, 38.1, 0), (0, -1, 0)))


with BuildPart() as f11:
    # F10 (on face) → F11 (new body)
    with BuildSketch(Plane.XY.offset(47.680292)):
        with Locations((-12.7, 28.768012)):
            Rectangle(F10_W, F10_H)
        with Locations((-12.7, 28.768012)):
            Circle(F10_R, mode=Mode.SUBTRACT)
    extrude(amount=F11_DEPTH)


with BuildPart() as f13:
    # F12 (on Front) → F13 (new body)
    with BuildSketch(Plane.XZ):
        with Locations((-27.419608, 28.385414)):
            Rectangle(F12_W, F12_H)
        with Locations((-27.419608, 28.385414)):
            Circle(F12_R, mode=Mode.SUBTRACT)
        with Locations((-27.419608, 28.385414)):
            Circle(F12_R)
    extrude(amount=-F13_DEPTH)

    # F14 (on face) → F15 (cut)
    with BuildSketch(Plane.XZ):
        with Locations((-27.419608, 28.385414)):
            Circle(F14_R)
    extrude(amount=-F15_DEPTH, mode=Mode.SUBTRACT)

    # F16
    f16_edges = [f13.edges().sort_by_distance(p)[0] for p in [
        (-27.419608, 0, 53.785414),
        (-52.819608, 25.4, 53.785414),
        (-52.819608, 0, 28.385414),
        (-52.819608, 25.4, 2.985414),
        (-27.419608, 0, 2.985414),
        (-2.019608, 0, 28.385414),
        (-33.769608, 0, 28.385414),
        (-2.019608, 25.4, 2.985414),
        (-27.419608, 50.8, 53.785414),
        (-2.019608, 25.4, 53.785414),
        (-2.019608, 50.8, 28.385414),
        (-52.819608, 50.8, 28.385414),
        (-27.419608, 50.8, 2.985414),
    ]]
    fillet(f16_edges, radius=F16_R)

    # F17 (on face) → F18 (join)
    with BuildSketch(Plane(origin=(-52.819608, 0, 0), x_dir=(0, -1, 0), z_dir=(-1, 0, 0))):
        with Locations((-25.4, 28.385414)):
            Circle(F17_R)
    extrude(amount=F18_DEPTH)

    # F19 (on face) → F20 (join)
    with BuildSketch(Plane.YZ.offset(-2.019608)):
        with Locations((25.4, 28.385414)):
            Circle(F19_R)
    extrude(amount=F20_DEPTH)

    # F21 (on face) → F22 (join)
    with BuildSketch(Plane.XY.offset(53.785414)):
        with Locations((-37.579608, 35.56)):
            Circle(F21_R)
        with Locations((-17.259608, 35.56)):
            Circle(F21_R)
        Polygon((-42.659608, 25.4), (-47.739608, 25.4), (-47.739608, 5.08), (-42.659608, 15.24), (-37.579608, 5.08), (-32.499608, 15.24), (-27.419608, 5.08), (-22.339608, 15.24), (-17.259608, 5.08), (-12.179608, 15.24), (-7.099608, 5.08), (-7.099608, 25.4), (-12.179608, 25.4), (-17.259608, 15.24), (-22.339608, 25.4), (-27.419608, 15.24), (-32.499608, 25.4), (-37.579608, 15.24), align=None)
    extrude(amount=F22_DEPTH)


solid = Compound([f1.part, f3.part, f5.part, f9.part, f11.part, f13.part])
